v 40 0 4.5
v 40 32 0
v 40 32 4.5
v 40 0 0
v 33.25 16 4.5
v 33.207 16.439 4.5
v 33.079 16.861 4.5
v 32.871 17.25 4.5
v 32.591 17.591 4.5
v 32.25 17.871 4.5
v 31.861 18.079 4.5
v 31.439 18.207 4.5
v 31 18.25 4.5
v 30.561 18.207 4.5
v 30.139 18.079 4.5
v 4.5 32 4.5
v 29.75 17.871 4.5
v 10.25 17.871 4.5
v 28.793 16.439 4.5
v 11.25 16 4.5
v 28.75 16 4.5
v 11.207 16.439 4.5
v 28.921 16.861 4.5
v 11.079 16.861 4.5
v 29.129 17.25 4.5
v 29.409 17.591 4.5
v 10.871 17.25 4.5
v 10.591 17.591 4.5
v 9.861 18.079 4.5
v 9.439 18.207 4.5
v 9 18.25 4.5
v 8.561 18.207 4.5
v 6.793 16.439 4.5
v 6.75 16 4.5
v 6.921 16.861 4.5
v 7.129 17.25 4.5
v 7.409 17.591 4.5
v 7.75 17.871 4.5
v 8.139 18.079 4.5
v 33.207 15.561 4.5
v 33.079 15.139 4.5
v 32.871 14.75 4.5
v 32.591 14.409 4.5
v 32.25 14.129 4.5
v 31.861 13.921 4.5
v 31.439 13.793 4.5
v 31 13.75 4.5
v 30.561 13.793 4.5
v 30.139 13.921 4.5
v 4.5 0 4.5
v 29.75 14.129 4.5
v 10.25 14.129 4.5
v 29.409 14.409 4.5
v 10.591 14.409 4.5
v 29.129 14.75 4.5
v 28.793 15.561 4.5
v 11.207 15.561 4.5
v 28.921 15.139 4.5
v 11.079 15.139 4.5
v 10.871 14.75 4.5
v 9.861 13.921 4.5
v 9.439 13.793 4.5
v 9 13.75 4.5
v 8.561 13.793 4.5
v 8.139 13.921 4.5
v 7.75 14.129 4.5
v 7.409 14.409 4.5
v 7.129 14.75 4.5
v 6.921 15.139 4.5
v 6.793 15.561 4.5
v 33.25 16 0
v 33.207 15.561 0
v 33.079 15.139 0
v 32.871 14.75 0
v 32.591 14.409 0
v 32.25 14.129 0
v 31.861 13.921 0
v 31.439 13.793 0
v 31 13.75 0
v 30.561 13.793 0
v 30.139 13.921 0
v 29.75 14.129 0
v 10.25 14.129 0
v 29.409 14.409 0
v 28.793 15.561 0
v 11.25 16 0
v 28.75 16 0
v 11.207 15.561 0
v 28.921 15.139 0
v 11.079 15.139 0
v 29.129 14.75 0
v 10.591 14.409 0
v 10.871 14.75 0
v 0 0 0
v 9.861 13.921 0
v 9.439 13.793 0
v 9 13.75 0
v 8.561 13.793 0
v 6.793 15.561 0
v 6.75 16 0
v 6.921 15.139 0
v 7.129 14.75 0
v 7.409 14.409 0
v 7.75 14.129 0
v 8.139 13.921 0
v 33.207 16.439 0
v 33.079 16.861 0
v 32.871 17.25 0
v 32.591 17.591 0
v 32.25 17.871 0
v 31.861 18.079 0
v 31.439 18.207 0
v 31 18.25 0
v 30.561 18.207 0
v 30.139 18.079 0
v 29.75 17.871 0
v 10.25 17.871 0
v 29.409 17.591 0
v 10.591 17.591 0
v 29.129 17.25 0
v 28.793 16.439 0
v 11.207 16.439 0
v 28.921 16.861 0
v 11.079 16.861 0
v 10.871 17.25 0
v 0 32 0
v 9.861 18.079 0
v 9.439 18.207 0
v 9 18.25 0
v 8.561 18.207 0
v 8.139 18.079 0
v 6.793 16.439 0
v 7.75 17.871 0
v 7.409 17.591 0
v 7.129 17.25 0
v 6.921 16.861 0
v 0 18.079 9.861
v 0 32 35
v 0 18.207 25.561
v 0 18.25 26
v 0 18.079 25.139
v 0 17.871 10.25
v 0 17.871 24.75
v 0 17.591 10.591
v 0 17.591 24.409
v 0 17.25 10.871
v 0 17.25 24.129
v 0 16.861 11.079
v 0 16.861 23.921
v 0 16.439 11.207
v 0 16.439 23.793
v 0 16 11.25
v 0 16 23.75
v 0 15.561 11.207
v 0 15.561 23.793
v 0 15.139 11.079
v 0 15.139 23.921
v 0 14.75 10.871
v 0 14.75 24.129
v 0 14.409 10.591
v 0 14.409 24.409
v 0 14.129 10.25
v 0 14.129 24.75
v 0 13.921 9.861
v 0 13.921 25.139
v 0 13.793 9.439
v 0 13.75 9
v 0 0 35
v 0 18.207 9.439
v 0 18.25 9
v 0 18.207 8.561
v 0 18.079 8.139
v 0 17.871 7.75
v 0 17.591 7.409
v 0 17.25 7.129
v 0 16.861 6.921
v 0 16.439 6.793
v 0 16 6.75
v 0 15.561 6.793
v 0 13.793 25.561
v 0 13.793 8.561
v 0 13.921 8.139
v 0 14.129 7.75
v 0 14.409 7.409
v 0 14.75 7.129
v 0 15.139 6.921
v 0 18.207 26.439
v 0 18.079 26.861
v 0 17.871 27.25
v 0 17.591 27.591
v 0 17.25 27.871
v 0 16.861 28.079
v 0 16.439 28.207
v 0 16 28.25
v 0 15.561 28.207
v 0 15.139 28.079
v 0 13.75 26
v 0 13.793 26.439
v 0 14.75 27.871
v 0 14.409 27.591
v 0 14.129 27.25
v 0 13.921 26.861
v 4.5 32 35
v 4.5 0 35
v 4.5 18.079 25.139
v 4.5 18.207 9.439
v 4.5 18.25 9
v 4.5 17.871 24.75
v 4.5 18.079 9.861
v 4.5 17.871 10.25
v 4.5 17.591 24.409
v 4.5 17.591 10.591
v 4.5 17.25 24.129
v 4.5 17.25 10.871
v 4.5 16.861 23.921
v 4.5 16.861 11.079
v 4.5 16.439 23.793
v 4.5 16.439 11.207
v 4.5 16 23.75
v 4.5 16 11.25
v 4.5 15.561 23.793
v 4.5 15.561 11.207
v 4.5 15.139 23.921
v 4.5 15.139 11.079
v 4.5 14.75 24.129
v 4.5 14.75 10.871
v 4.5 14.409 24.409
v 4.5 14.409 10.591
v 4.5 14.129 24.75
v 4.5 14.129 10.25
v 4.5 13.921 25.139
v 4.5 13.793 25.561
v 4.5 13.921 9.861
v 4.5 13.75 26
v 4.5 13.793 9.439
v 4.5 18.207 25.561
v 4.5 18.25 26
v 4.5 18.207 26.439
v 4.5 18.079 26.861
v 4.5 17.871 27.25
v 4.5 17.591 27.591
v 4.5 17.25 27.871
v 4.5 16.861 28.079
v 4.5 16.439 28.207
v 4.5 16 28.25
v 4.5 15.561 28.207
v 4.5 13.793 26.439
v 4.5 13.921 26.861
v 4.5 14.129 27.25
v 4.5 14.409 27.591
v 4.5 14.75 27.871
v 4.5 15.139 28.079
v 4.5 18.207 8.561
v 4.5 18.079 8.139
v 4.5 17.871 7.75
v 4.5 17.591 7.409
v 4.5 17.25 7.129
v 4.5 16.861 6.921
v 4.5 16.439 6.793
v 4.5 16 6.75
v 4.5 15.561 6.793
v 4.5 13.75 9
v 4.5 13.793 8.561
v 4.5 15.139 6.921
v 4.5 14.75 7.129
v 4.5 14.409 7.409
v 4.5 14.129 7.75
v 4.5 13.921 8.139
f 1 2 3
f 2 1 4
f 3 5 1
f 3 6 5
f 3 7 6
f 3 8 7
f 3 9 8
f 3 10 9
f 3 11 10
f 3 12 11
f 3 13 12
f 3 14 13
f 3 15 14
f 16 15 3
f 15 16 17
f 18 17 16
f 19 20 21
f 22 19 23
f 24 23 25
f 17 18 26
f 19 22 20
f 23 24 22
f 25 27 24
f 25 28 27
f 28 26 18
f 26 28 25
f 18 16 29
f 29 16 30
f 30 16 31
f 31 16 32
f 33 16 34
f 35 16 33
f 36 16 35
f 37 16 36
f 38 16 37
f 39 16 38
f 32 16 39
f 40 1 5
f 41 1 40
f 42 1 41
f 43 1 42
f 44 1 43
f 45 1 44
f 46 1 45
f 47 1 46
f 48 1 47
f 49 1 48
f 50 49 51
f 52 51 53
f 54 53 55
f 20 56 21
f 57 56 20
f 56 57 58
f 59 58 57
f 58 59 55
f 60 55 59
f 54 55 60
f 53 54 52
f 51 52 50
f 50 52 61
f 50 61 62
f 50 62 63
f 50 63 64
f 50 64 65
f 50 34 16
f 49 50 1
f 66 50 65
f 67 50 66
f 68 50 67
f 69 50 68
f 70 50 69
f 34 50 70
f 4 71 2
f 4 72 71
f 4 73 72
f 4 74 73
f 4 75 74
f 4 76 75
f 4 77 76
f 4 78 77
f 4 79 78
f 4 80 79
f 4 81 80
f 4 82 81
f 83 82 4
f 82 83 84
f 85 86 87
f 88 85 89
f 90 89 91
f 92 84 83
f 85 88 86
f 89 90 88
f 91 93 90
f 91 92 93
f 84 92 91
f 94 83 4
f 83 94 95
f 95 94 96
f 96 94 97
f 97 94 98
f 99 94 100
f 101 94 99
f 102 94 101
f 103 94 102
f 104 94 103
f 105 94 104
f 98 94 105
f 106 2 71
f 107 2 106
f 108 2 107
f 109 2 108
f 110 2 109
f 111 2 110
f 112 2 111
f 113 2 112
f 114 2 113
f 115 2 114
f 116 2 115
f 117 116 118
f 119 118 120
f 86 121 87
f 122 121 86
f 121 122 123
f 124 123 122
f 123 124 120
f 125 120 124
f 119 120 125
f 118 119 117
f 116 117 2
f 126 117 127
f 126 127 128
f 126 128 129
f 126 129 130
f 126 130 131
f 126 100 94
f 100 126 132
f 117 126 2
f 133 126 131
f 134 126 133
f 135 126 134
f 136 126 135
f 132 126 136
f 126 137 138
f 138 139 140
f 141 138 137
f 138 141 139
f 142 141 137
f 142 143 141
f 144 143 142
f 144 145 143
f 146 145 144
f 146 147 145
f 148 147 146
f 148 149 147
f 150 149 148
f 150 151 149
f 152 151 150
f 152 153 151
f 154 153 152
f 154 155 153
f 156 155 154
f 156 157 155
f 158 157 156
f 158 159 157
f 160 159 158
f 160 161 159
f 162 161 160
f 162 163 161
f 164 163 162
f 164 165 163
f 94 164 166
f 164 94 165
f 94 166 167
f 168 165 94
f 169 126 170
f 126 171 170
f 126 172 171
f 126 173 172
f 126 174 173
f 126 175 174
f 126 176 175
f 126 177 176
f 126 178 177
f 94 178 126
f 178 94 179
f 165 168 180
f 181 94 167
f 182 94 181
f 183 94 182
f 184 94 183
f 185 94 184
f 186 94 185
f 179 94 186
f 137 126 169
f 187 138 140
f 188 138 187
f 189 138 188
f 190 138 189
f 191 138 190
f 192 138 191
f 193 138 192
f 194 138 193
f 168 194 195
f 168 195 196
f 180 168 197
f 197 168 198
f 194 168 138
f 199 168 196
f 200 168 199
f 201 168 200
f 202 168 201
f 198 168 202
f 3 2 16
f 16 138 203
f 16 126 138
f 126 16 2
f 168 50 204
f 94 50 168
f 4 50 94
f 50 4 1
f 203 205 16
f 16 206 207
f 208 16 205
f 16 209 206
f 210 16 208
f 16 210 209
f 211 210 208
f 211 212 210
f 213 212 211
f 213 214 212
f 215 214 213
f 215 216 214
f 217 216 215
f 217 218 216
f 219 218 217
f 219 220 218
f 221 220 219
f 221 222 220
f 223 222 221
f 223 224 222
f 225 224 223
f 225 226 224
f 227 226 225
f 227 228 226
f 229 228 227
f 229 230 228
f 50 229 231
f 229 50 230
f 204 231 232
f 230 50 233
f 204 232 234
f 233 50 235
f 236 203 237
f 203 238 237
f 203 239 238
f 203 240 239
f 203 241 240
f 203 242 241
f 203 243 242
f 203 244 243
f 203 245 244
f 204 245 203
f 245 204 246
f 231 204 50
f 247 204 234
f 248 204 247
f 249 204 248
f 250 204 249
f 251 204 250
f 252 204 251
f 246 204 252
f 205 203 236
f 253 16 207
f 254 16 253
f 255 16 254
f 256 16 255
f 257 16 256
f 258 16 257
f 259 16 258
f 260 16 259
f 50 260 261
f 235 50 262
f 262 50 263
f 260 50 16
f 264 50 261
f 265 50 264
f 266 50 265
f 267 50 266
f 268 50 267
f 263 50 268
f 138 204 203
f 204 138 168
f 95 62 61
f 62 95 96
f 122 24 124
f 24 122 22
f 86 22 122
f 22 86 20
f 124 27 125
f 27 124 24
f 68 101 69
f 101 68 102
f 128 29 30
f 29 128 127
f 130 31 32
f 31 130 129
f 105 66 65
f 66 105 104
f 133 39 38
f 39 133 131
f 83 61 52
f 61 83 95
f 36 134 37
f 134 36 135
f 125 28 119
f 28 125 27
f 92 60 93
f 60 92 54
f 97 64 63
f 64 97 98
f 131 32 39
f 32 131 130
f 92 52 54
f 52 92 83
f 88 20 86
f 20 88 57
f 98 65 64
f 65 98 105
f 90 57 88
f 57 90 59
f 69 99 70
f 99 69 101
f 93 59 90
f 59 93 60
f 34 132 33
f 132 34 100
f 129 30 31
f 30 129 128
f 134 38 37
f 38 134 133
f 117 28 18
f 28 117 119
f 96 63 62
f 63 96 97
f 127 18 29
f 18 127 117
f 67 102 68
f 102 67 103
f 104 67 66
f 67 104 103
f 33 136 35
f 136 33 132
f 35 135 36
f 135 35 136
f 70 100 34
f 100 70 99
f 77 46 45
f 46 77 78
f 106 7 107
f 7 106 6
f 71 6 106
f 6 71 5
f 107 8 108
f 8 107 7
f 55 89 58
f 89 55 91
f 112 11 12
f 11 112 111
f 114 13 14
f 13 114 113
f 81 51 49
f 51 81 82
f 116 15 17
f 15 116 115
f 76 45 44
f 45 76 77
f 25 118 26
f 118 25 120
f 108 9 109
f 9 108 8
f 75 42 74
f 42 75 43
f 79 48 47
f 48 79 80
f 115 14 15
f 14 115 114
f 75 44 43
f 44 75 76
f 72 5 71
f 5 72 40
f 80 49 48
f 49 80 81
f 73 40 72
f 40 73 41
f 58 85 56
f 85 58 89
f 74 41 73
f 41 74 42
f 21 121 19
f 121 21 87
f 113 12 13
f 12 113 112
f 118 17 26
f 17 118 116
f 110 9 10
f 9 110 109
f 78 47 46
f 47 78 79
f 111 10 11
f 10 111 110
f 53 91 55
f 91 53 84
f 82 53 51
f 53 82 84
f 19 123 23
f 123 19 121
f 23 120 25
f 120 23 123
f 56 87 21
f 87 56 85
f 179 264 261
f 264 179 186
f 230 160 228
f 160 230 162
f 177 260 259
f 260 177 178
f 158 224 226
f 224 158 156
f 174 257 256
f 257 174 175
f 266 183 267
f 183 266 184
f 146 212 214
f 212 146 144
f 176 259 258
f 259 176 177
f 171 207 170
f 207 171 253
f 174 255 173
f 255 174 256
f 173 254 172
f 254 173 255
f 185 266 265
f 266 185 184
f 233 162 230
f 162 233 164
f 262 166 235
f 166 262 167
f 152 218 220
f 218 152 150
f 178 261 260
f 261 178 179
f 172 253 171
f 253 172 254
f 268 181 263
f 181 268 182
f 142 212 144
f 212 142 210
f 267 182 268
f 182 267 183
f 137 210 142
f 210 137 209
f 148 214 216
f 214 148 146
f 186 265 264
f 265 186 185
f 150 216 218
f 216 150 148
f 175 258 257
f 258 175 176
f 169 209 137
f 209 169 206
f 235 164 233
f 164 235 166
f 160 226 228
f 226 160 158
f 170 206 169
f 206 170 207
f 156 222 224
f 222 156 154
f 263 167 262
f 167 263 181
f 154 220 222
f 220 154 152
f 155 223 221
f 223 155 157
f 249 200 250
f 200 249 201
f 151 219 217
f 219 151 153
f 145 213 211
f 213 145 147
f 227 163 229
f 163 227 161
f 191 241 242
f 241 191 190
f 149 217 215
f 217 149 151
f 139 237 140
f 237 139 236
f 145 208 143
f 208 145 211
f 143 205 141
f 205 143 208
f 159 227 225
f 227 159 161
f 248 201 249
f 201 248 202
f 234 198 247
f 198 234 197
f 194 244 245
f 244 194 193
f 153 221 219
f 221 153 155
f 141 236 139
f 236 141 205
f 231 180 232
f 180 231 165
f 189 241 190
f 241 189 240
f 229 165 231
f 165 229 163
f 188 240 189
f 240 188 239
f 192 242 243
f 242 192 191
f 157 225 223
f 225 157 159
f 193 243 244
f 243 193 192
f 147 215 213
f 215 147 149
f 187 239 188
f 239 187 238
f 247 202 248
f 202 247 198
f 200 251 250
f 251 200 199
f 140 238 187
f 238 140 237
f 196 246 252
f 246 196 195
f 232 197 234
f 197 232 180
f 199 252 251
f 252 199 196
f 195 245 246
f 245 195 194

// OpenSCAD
$fn = 32;

// ----------------------------------------------------------------------
// L-bracket: 40 x 32 x 35 mm
// ----------------------------------------------------------------------

// --- parameters (mm) ---
horiz_len = 40;           // horizontal leg, X
vert_len = 35;            // vertical leg, Z
profile_w = 32;           // bracket depth, Y
plate_t = 4.5;            // plate thickness
hole_d = 4.5;             // clearance for M4

module hole_z(px, py) {
  translate([px, py, -0.5]) cylinder(h = plate_t + 1, d = hole_d);
}
module hole_x(pz, py) {
  translate([-0.5, py, pz]) rotate([0, 90, 0]) cylinder(h = plate_t + 1, d = hole_d);
}

difference() {
  union() {
    /* horizontal leg */
    cube([horiz_len, profile_w, plate_t]);
    /* vertical leg, overlapping the corner block */
    cube([plate_t, profile_w, vert_len]);
  }
  hole_z(9, 16);
  hole_z(31, 16);
  hole_x(9, 16);
  hole_x(26, 16);
}
